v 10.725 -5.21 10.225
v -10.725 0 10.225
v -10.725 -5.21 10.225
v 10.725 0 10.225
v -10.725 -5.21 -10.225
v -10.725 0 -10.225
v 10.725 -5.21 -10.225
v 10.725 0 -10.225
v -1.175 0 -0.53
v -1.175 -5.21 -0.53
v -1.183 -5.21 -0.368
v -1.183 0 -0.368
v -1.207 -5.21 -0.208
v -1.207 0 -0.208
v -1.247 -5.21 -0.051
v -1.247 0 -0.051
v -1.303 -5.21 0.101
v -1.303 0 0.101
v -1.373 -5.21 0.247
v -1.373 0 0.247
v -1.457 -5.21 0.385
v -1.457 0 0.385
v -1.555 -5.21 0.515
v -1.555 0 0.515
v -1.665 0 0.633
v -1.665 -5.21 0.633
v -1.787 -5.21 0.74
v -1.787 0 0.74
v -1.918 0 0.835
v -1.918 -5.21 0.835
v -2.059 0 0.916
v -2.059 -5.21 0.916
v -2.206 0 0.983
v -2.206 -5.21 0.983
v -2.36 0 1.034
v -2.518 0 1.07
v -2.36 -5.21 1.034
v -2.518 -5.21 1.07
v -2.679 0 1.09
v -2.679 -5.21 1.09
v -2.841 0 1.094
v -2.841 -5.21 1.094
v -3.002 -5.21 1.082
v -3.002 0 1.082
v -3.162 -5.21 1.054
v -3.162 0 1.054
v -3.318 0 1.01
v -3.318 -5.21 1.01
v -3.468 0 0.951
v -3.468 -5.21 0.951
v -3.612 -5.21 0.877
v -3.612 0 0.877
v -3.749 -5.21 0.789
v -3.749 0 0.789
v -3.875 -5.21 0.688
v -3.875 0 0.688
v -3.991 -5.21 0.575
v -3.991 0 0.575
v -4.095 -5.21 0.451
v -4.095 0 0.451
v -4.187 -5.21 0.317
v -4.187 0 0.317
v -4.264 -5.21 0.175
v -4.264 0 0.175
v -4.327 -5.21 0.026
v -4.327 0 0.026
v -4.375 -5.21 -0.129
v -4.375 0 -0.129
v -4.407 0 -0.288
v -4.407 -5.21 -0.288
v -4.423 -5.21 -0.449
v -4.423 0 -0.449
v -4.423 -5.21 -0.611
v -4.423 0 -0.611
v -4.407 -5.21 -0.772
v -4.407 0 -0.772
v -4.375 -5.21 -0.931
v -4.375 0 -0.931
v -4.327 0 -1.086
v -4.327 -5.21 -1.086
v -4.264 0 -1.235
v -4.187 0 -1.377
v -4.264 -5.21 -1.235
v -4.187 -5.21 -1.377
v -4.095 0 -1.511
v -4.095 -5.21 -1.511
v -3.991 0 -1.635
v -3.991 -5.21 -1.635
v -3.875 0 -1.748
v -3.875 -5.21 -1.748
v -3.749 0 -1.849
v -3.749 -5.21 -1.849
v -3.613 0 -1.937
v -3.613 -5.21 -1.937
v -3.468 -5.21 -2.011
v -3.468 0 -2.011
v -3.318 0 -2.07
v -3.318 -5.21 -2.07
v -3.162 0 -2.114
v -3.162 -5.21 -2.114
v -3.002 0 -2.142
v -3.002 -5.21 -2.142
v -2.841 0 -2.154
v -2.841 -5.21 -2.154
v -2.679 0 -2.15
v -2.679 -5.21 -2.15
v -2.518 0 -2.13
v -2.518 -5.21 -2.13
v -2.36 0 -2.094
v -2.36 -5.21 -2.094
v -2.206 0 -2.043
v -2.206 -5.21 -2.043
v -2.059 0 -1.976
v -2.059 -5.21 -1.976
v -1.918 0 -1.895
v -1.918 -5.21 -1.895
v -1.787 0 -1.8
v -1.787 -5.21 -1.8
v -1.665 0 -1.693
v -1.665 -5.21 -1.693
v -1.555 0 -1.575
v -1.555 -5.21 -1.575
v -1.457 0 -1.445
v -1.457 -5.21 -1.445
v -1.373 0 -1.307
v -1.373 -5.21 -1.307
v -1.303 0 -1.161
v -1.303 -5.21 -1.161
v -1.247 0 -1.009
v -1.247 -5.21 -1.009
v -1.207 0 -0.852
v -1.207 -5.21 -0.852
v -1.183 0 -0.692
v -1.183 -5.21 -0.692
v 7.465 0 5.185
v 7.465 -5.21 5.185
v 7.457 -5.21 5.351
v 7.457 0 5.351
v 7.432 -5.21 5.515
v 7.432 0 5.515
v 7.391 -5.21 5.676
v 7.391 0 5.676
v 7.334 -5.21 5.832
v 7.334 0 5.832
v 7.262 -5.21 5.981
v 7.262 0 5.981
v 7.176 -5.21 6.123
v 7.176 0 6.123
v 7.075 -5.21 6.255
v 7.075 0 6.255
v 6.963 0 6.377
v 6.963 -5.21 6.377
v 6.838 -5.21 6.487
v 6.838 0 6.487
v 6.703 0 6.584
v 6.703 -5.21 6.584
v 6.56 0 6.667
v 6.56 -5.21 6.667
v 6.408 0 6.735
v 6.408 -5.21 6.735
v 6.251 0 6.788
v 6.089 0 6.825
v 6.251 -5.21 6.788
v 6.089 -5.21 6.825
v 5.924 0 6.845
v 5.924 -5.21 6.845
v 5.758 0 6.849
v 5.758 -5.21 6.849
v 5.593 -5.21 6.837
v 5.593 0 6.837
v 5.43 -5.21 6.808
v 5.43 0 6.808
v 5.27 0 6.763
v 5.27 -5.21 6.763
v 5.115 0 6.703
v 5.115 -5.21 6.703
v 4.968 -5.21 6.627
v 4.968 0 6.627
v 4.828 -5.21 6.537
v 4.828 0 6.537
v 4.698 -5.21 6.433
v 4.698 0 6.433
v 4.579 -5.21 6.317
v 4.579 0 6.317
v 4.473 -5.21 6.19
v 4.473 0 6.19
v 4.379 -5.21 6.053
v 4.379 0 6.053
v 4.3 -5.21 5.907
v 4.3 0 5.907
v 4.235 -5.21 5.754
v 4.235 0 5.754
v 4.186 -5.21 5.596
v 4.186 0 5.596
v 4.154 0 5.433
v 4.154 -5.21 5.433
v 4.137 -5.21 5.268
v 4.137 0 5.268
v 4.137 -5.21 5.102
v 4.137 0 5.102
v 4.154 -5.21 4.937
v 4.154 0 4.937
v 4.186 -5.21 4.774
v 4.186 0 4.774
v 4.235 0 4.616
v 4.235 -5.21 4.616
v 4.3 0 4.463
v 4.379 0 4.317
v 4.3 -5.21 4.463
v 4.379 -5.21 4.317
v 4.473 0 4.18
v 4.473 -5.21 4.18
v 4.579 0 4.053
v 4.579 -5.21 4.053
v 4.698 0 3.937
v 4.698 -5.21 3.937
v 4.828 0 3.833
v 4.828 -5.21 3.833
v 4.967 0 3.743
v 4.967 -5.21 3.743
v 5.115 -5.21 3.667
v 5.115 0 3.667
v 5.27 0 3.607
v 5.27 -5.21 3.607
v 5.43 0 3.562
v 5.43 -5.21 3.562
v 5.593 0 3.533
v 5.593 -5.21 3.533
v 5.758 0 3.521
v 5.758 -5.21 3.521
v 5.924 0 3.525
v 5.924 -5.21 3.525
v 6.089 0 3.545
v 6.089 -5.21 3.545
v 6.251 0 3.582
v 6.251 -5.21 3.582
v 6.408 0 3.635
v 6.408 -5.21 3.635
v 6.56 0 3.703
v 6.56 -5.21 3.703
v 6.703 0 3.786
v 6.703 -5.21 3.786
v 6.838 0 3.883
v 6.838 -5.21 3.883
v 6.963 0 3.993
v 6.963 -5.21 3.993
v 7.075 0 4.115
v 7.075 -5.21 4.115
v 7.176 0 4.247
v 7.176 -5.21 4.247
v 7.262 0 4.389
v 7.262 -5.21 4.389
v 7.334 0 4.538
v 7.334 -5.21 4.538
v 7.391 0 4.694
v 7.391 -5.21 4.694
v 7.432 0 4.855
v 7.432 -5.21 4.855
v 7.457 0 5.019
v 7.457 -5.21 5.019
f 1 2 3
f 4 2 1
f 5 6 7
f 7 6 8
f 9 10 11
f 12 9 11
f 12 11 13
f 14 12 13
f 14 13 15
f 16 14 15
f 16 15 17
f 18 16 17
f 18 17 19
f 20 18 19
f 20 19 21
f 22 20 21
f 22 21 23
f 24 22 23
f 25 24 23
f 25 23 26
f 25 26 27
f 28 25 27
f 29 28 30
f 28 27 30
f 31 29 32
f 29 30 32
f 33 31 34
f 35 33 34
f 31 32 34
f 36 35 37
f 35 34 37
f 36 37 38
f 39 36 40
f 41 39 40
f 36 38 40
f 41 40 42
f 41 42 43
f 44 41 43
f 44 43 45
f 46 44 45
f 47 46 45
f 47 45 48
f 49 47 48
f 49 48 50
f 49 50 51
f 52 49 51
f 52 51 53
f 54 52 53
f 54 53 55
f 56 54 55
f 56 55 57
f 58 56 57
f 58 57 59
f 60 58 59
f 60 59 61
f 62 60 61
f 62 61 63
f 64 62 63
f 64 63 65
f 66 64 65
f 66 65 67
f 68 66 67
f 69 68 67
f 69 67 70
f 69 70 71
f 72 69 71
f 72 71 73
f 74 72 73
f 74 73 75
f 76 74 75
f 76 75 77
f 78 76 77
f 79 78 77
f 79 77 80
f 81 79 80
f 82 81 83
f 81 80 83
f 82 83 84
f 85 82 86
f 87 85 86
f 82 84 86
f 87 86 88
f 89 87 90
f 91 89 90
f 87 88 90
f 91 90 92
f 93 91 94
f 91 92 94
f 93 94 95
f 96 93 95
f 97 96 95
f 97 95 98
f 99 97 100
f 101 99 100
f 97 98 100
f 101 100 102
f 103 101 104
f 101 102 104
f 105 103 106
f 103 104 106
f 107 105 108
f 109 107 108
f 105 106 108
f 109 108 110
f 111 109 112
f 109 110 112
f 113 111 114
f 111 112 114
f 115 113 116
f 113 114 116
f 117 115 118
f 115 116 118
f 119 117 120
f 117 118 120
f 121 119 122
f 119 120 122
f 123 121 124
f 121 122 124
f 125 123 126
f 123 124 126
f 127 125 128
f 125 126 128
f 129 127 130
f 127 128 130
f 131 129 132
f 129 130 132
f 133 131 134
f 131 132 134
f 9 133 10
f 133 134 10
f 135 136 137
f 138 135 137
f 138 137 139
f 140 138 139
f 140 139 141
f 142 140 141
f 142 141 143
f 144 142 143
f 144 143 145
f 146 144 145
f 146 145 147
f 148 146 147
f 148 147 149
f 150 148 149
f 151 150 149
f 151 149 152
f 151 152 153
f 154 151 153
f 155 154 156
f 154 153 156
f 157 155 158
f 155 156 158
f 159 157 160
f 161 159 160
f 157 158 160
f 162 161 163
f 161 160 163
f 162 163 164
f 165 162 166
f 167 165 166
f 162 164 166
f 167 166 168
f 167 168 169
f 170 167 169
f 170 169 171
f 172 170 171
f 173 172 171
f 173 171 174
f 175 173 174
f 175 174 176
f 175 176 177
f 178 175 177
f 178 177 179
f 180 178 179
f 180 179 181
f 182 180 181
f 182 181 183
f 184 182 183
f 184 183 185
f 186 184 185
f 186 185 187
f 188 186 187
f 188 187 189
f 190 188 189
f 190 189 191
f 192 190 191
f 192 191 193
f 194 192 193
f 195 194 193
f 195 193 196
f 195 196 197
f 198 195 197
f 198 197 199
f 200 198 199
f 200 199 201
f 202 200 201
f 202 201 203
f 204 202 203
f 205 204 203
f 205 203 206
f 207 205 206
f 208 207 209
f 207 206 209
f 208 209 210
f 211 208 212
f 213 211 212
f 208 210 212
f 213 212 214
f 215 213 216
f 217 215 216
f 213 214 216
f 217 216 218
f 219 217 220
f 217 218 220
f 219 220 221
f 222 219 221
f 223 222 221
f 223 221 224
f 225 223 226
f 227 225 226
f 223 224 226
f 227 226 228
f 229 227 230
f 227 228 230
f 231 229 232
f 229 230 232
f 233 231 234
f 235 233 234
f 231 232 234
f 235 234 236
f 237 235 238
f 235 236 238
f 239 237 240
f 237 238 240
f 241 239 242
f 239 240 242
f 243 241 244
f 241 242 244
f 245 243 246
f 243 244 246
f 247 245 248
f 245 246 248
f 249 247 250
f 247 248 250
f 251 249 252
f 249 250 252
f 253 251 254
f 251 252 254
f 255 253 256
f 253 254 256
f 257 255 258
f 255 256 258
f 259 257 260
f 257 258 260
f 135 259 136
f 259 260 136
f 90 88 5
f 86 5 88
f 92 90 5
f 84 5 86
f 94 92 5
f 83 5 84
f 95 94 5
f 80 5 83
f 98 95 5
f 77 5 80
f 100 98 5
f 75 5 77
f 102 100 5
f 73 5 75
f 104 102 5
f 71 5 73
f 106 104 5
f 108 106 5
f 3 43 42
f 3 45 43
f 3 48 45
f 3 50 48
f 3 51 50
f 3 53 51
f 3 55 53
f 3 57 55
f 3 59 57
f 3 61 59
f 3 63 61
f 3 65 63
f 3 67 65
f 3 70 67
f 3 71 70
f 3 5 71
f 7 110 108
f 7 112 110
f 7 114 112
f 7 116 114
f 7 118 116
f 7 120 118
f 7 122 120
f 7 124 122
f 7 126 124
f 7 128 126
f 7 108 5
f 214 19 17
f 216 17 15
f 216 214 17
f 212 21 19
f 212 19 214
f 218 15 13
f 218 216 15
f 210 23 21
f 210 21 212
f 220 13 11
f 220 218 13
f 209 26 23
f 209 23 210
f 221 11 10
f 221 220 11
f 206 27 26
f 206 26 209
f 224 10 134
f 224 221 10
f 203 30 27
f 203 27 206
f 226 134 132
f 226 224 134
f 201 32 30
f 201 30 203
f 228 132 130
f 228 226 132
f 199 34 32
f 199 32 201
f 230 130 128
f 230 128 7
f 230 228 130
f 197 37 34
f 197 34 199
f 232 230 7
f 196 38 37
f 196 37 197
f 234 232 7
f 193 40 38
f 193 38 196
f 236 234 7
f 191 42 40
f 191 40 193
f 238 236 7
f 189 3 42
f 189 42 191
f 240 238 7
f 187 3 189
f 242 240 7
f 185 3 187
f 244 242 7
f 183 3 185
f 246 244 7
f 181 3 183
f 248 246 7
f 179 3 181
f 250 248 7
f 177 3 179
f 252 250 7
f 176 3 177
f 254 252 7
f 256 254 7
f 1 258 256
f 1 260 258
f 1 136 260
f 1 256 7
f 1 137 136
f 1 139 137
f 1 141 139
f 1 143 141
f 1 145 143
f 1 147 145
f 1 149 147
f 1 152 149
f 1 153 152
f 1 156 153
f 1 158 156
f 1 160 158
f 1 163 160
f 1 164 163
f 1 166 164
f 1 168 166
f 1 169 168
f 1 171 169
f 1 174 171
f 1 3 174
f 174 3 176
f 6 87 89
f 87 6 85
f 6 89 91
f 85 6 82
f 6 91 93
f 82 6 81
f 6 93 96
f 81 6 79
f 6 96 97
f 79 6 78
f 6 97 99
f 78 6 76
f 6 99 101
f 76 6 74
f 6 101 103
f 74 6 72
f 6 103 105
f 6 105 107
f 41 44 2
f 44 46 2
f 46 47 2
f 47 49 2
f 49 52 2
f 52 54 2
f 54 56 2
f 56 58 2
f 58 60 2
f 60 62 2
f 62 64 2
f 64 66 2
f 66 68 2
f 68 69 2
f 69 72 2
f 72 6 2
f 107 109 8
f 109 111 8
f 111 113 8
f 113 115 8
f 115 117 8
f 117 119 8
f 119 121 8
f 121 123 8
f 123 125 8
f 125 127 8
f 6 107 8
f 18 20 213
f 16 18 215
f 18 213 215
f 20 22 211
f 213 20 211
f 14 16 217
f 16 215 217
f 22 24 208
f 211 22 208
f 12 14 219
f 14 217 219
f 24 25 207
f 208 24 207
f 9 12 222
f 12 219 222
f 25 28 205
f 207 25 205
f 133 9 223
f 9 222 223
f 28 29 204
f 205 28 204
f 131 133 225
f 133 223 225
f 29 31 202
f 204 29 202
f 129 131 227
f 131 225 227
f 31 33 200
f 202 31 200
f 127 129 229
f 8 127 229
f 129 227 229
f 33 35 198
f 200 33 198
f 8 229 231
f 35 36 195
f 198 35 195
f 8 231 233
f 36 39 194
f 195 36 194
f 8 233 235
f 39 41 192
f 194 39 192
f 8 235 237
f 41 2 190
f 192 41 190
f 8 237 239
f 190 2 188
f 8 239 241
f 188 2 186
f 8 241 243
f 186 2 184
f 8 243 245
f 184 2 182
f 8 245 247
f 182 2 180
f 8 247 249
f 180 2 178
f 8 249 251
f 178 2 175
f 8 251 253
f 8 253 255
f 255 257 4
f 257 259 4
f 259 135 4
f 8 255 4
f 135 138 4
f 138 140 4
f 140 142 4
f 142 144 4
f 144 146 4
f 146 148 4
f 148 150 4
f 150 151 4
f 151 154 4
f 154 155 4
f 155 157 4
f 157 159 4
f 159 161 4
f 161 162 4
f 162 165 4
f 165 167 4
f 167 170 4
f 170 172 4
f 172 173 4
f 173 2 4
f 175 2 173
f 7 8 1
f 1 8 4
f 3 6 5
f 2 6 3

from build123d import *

# Parameters (mm, degrees)
F0_W     = 21.45
F0_H     = 20.45
F1_DEPTH = 5.21
F3_R     = 1.625
F2_R     = 1.665
F4_DEPTH = 5.211


with BuildPart() as f1:
    # F0 (on Front) → F1 (new body)
    with BuildSketch(Plane.XZ):
        Rectangle(F0_W, F0_H)
    extrude(amount=F1_DEPTH)

    # F3 (on face) + F2 (on face) → F4 (cut, through all)
    with BuildSketch(Plane.XZ.offset(5.21)):
        with Locations((-2.8, -0.53)):
            Circle(F3_R)
    with BuildSketch(Plane.XZ.offset(5.21)):
        with Locations((5.8, 5.185)):
            Circle(F2_R)
    extrude(amount=-F4_DEPTH, mode=Mode.SUBTRACT)


solid = f1.part
